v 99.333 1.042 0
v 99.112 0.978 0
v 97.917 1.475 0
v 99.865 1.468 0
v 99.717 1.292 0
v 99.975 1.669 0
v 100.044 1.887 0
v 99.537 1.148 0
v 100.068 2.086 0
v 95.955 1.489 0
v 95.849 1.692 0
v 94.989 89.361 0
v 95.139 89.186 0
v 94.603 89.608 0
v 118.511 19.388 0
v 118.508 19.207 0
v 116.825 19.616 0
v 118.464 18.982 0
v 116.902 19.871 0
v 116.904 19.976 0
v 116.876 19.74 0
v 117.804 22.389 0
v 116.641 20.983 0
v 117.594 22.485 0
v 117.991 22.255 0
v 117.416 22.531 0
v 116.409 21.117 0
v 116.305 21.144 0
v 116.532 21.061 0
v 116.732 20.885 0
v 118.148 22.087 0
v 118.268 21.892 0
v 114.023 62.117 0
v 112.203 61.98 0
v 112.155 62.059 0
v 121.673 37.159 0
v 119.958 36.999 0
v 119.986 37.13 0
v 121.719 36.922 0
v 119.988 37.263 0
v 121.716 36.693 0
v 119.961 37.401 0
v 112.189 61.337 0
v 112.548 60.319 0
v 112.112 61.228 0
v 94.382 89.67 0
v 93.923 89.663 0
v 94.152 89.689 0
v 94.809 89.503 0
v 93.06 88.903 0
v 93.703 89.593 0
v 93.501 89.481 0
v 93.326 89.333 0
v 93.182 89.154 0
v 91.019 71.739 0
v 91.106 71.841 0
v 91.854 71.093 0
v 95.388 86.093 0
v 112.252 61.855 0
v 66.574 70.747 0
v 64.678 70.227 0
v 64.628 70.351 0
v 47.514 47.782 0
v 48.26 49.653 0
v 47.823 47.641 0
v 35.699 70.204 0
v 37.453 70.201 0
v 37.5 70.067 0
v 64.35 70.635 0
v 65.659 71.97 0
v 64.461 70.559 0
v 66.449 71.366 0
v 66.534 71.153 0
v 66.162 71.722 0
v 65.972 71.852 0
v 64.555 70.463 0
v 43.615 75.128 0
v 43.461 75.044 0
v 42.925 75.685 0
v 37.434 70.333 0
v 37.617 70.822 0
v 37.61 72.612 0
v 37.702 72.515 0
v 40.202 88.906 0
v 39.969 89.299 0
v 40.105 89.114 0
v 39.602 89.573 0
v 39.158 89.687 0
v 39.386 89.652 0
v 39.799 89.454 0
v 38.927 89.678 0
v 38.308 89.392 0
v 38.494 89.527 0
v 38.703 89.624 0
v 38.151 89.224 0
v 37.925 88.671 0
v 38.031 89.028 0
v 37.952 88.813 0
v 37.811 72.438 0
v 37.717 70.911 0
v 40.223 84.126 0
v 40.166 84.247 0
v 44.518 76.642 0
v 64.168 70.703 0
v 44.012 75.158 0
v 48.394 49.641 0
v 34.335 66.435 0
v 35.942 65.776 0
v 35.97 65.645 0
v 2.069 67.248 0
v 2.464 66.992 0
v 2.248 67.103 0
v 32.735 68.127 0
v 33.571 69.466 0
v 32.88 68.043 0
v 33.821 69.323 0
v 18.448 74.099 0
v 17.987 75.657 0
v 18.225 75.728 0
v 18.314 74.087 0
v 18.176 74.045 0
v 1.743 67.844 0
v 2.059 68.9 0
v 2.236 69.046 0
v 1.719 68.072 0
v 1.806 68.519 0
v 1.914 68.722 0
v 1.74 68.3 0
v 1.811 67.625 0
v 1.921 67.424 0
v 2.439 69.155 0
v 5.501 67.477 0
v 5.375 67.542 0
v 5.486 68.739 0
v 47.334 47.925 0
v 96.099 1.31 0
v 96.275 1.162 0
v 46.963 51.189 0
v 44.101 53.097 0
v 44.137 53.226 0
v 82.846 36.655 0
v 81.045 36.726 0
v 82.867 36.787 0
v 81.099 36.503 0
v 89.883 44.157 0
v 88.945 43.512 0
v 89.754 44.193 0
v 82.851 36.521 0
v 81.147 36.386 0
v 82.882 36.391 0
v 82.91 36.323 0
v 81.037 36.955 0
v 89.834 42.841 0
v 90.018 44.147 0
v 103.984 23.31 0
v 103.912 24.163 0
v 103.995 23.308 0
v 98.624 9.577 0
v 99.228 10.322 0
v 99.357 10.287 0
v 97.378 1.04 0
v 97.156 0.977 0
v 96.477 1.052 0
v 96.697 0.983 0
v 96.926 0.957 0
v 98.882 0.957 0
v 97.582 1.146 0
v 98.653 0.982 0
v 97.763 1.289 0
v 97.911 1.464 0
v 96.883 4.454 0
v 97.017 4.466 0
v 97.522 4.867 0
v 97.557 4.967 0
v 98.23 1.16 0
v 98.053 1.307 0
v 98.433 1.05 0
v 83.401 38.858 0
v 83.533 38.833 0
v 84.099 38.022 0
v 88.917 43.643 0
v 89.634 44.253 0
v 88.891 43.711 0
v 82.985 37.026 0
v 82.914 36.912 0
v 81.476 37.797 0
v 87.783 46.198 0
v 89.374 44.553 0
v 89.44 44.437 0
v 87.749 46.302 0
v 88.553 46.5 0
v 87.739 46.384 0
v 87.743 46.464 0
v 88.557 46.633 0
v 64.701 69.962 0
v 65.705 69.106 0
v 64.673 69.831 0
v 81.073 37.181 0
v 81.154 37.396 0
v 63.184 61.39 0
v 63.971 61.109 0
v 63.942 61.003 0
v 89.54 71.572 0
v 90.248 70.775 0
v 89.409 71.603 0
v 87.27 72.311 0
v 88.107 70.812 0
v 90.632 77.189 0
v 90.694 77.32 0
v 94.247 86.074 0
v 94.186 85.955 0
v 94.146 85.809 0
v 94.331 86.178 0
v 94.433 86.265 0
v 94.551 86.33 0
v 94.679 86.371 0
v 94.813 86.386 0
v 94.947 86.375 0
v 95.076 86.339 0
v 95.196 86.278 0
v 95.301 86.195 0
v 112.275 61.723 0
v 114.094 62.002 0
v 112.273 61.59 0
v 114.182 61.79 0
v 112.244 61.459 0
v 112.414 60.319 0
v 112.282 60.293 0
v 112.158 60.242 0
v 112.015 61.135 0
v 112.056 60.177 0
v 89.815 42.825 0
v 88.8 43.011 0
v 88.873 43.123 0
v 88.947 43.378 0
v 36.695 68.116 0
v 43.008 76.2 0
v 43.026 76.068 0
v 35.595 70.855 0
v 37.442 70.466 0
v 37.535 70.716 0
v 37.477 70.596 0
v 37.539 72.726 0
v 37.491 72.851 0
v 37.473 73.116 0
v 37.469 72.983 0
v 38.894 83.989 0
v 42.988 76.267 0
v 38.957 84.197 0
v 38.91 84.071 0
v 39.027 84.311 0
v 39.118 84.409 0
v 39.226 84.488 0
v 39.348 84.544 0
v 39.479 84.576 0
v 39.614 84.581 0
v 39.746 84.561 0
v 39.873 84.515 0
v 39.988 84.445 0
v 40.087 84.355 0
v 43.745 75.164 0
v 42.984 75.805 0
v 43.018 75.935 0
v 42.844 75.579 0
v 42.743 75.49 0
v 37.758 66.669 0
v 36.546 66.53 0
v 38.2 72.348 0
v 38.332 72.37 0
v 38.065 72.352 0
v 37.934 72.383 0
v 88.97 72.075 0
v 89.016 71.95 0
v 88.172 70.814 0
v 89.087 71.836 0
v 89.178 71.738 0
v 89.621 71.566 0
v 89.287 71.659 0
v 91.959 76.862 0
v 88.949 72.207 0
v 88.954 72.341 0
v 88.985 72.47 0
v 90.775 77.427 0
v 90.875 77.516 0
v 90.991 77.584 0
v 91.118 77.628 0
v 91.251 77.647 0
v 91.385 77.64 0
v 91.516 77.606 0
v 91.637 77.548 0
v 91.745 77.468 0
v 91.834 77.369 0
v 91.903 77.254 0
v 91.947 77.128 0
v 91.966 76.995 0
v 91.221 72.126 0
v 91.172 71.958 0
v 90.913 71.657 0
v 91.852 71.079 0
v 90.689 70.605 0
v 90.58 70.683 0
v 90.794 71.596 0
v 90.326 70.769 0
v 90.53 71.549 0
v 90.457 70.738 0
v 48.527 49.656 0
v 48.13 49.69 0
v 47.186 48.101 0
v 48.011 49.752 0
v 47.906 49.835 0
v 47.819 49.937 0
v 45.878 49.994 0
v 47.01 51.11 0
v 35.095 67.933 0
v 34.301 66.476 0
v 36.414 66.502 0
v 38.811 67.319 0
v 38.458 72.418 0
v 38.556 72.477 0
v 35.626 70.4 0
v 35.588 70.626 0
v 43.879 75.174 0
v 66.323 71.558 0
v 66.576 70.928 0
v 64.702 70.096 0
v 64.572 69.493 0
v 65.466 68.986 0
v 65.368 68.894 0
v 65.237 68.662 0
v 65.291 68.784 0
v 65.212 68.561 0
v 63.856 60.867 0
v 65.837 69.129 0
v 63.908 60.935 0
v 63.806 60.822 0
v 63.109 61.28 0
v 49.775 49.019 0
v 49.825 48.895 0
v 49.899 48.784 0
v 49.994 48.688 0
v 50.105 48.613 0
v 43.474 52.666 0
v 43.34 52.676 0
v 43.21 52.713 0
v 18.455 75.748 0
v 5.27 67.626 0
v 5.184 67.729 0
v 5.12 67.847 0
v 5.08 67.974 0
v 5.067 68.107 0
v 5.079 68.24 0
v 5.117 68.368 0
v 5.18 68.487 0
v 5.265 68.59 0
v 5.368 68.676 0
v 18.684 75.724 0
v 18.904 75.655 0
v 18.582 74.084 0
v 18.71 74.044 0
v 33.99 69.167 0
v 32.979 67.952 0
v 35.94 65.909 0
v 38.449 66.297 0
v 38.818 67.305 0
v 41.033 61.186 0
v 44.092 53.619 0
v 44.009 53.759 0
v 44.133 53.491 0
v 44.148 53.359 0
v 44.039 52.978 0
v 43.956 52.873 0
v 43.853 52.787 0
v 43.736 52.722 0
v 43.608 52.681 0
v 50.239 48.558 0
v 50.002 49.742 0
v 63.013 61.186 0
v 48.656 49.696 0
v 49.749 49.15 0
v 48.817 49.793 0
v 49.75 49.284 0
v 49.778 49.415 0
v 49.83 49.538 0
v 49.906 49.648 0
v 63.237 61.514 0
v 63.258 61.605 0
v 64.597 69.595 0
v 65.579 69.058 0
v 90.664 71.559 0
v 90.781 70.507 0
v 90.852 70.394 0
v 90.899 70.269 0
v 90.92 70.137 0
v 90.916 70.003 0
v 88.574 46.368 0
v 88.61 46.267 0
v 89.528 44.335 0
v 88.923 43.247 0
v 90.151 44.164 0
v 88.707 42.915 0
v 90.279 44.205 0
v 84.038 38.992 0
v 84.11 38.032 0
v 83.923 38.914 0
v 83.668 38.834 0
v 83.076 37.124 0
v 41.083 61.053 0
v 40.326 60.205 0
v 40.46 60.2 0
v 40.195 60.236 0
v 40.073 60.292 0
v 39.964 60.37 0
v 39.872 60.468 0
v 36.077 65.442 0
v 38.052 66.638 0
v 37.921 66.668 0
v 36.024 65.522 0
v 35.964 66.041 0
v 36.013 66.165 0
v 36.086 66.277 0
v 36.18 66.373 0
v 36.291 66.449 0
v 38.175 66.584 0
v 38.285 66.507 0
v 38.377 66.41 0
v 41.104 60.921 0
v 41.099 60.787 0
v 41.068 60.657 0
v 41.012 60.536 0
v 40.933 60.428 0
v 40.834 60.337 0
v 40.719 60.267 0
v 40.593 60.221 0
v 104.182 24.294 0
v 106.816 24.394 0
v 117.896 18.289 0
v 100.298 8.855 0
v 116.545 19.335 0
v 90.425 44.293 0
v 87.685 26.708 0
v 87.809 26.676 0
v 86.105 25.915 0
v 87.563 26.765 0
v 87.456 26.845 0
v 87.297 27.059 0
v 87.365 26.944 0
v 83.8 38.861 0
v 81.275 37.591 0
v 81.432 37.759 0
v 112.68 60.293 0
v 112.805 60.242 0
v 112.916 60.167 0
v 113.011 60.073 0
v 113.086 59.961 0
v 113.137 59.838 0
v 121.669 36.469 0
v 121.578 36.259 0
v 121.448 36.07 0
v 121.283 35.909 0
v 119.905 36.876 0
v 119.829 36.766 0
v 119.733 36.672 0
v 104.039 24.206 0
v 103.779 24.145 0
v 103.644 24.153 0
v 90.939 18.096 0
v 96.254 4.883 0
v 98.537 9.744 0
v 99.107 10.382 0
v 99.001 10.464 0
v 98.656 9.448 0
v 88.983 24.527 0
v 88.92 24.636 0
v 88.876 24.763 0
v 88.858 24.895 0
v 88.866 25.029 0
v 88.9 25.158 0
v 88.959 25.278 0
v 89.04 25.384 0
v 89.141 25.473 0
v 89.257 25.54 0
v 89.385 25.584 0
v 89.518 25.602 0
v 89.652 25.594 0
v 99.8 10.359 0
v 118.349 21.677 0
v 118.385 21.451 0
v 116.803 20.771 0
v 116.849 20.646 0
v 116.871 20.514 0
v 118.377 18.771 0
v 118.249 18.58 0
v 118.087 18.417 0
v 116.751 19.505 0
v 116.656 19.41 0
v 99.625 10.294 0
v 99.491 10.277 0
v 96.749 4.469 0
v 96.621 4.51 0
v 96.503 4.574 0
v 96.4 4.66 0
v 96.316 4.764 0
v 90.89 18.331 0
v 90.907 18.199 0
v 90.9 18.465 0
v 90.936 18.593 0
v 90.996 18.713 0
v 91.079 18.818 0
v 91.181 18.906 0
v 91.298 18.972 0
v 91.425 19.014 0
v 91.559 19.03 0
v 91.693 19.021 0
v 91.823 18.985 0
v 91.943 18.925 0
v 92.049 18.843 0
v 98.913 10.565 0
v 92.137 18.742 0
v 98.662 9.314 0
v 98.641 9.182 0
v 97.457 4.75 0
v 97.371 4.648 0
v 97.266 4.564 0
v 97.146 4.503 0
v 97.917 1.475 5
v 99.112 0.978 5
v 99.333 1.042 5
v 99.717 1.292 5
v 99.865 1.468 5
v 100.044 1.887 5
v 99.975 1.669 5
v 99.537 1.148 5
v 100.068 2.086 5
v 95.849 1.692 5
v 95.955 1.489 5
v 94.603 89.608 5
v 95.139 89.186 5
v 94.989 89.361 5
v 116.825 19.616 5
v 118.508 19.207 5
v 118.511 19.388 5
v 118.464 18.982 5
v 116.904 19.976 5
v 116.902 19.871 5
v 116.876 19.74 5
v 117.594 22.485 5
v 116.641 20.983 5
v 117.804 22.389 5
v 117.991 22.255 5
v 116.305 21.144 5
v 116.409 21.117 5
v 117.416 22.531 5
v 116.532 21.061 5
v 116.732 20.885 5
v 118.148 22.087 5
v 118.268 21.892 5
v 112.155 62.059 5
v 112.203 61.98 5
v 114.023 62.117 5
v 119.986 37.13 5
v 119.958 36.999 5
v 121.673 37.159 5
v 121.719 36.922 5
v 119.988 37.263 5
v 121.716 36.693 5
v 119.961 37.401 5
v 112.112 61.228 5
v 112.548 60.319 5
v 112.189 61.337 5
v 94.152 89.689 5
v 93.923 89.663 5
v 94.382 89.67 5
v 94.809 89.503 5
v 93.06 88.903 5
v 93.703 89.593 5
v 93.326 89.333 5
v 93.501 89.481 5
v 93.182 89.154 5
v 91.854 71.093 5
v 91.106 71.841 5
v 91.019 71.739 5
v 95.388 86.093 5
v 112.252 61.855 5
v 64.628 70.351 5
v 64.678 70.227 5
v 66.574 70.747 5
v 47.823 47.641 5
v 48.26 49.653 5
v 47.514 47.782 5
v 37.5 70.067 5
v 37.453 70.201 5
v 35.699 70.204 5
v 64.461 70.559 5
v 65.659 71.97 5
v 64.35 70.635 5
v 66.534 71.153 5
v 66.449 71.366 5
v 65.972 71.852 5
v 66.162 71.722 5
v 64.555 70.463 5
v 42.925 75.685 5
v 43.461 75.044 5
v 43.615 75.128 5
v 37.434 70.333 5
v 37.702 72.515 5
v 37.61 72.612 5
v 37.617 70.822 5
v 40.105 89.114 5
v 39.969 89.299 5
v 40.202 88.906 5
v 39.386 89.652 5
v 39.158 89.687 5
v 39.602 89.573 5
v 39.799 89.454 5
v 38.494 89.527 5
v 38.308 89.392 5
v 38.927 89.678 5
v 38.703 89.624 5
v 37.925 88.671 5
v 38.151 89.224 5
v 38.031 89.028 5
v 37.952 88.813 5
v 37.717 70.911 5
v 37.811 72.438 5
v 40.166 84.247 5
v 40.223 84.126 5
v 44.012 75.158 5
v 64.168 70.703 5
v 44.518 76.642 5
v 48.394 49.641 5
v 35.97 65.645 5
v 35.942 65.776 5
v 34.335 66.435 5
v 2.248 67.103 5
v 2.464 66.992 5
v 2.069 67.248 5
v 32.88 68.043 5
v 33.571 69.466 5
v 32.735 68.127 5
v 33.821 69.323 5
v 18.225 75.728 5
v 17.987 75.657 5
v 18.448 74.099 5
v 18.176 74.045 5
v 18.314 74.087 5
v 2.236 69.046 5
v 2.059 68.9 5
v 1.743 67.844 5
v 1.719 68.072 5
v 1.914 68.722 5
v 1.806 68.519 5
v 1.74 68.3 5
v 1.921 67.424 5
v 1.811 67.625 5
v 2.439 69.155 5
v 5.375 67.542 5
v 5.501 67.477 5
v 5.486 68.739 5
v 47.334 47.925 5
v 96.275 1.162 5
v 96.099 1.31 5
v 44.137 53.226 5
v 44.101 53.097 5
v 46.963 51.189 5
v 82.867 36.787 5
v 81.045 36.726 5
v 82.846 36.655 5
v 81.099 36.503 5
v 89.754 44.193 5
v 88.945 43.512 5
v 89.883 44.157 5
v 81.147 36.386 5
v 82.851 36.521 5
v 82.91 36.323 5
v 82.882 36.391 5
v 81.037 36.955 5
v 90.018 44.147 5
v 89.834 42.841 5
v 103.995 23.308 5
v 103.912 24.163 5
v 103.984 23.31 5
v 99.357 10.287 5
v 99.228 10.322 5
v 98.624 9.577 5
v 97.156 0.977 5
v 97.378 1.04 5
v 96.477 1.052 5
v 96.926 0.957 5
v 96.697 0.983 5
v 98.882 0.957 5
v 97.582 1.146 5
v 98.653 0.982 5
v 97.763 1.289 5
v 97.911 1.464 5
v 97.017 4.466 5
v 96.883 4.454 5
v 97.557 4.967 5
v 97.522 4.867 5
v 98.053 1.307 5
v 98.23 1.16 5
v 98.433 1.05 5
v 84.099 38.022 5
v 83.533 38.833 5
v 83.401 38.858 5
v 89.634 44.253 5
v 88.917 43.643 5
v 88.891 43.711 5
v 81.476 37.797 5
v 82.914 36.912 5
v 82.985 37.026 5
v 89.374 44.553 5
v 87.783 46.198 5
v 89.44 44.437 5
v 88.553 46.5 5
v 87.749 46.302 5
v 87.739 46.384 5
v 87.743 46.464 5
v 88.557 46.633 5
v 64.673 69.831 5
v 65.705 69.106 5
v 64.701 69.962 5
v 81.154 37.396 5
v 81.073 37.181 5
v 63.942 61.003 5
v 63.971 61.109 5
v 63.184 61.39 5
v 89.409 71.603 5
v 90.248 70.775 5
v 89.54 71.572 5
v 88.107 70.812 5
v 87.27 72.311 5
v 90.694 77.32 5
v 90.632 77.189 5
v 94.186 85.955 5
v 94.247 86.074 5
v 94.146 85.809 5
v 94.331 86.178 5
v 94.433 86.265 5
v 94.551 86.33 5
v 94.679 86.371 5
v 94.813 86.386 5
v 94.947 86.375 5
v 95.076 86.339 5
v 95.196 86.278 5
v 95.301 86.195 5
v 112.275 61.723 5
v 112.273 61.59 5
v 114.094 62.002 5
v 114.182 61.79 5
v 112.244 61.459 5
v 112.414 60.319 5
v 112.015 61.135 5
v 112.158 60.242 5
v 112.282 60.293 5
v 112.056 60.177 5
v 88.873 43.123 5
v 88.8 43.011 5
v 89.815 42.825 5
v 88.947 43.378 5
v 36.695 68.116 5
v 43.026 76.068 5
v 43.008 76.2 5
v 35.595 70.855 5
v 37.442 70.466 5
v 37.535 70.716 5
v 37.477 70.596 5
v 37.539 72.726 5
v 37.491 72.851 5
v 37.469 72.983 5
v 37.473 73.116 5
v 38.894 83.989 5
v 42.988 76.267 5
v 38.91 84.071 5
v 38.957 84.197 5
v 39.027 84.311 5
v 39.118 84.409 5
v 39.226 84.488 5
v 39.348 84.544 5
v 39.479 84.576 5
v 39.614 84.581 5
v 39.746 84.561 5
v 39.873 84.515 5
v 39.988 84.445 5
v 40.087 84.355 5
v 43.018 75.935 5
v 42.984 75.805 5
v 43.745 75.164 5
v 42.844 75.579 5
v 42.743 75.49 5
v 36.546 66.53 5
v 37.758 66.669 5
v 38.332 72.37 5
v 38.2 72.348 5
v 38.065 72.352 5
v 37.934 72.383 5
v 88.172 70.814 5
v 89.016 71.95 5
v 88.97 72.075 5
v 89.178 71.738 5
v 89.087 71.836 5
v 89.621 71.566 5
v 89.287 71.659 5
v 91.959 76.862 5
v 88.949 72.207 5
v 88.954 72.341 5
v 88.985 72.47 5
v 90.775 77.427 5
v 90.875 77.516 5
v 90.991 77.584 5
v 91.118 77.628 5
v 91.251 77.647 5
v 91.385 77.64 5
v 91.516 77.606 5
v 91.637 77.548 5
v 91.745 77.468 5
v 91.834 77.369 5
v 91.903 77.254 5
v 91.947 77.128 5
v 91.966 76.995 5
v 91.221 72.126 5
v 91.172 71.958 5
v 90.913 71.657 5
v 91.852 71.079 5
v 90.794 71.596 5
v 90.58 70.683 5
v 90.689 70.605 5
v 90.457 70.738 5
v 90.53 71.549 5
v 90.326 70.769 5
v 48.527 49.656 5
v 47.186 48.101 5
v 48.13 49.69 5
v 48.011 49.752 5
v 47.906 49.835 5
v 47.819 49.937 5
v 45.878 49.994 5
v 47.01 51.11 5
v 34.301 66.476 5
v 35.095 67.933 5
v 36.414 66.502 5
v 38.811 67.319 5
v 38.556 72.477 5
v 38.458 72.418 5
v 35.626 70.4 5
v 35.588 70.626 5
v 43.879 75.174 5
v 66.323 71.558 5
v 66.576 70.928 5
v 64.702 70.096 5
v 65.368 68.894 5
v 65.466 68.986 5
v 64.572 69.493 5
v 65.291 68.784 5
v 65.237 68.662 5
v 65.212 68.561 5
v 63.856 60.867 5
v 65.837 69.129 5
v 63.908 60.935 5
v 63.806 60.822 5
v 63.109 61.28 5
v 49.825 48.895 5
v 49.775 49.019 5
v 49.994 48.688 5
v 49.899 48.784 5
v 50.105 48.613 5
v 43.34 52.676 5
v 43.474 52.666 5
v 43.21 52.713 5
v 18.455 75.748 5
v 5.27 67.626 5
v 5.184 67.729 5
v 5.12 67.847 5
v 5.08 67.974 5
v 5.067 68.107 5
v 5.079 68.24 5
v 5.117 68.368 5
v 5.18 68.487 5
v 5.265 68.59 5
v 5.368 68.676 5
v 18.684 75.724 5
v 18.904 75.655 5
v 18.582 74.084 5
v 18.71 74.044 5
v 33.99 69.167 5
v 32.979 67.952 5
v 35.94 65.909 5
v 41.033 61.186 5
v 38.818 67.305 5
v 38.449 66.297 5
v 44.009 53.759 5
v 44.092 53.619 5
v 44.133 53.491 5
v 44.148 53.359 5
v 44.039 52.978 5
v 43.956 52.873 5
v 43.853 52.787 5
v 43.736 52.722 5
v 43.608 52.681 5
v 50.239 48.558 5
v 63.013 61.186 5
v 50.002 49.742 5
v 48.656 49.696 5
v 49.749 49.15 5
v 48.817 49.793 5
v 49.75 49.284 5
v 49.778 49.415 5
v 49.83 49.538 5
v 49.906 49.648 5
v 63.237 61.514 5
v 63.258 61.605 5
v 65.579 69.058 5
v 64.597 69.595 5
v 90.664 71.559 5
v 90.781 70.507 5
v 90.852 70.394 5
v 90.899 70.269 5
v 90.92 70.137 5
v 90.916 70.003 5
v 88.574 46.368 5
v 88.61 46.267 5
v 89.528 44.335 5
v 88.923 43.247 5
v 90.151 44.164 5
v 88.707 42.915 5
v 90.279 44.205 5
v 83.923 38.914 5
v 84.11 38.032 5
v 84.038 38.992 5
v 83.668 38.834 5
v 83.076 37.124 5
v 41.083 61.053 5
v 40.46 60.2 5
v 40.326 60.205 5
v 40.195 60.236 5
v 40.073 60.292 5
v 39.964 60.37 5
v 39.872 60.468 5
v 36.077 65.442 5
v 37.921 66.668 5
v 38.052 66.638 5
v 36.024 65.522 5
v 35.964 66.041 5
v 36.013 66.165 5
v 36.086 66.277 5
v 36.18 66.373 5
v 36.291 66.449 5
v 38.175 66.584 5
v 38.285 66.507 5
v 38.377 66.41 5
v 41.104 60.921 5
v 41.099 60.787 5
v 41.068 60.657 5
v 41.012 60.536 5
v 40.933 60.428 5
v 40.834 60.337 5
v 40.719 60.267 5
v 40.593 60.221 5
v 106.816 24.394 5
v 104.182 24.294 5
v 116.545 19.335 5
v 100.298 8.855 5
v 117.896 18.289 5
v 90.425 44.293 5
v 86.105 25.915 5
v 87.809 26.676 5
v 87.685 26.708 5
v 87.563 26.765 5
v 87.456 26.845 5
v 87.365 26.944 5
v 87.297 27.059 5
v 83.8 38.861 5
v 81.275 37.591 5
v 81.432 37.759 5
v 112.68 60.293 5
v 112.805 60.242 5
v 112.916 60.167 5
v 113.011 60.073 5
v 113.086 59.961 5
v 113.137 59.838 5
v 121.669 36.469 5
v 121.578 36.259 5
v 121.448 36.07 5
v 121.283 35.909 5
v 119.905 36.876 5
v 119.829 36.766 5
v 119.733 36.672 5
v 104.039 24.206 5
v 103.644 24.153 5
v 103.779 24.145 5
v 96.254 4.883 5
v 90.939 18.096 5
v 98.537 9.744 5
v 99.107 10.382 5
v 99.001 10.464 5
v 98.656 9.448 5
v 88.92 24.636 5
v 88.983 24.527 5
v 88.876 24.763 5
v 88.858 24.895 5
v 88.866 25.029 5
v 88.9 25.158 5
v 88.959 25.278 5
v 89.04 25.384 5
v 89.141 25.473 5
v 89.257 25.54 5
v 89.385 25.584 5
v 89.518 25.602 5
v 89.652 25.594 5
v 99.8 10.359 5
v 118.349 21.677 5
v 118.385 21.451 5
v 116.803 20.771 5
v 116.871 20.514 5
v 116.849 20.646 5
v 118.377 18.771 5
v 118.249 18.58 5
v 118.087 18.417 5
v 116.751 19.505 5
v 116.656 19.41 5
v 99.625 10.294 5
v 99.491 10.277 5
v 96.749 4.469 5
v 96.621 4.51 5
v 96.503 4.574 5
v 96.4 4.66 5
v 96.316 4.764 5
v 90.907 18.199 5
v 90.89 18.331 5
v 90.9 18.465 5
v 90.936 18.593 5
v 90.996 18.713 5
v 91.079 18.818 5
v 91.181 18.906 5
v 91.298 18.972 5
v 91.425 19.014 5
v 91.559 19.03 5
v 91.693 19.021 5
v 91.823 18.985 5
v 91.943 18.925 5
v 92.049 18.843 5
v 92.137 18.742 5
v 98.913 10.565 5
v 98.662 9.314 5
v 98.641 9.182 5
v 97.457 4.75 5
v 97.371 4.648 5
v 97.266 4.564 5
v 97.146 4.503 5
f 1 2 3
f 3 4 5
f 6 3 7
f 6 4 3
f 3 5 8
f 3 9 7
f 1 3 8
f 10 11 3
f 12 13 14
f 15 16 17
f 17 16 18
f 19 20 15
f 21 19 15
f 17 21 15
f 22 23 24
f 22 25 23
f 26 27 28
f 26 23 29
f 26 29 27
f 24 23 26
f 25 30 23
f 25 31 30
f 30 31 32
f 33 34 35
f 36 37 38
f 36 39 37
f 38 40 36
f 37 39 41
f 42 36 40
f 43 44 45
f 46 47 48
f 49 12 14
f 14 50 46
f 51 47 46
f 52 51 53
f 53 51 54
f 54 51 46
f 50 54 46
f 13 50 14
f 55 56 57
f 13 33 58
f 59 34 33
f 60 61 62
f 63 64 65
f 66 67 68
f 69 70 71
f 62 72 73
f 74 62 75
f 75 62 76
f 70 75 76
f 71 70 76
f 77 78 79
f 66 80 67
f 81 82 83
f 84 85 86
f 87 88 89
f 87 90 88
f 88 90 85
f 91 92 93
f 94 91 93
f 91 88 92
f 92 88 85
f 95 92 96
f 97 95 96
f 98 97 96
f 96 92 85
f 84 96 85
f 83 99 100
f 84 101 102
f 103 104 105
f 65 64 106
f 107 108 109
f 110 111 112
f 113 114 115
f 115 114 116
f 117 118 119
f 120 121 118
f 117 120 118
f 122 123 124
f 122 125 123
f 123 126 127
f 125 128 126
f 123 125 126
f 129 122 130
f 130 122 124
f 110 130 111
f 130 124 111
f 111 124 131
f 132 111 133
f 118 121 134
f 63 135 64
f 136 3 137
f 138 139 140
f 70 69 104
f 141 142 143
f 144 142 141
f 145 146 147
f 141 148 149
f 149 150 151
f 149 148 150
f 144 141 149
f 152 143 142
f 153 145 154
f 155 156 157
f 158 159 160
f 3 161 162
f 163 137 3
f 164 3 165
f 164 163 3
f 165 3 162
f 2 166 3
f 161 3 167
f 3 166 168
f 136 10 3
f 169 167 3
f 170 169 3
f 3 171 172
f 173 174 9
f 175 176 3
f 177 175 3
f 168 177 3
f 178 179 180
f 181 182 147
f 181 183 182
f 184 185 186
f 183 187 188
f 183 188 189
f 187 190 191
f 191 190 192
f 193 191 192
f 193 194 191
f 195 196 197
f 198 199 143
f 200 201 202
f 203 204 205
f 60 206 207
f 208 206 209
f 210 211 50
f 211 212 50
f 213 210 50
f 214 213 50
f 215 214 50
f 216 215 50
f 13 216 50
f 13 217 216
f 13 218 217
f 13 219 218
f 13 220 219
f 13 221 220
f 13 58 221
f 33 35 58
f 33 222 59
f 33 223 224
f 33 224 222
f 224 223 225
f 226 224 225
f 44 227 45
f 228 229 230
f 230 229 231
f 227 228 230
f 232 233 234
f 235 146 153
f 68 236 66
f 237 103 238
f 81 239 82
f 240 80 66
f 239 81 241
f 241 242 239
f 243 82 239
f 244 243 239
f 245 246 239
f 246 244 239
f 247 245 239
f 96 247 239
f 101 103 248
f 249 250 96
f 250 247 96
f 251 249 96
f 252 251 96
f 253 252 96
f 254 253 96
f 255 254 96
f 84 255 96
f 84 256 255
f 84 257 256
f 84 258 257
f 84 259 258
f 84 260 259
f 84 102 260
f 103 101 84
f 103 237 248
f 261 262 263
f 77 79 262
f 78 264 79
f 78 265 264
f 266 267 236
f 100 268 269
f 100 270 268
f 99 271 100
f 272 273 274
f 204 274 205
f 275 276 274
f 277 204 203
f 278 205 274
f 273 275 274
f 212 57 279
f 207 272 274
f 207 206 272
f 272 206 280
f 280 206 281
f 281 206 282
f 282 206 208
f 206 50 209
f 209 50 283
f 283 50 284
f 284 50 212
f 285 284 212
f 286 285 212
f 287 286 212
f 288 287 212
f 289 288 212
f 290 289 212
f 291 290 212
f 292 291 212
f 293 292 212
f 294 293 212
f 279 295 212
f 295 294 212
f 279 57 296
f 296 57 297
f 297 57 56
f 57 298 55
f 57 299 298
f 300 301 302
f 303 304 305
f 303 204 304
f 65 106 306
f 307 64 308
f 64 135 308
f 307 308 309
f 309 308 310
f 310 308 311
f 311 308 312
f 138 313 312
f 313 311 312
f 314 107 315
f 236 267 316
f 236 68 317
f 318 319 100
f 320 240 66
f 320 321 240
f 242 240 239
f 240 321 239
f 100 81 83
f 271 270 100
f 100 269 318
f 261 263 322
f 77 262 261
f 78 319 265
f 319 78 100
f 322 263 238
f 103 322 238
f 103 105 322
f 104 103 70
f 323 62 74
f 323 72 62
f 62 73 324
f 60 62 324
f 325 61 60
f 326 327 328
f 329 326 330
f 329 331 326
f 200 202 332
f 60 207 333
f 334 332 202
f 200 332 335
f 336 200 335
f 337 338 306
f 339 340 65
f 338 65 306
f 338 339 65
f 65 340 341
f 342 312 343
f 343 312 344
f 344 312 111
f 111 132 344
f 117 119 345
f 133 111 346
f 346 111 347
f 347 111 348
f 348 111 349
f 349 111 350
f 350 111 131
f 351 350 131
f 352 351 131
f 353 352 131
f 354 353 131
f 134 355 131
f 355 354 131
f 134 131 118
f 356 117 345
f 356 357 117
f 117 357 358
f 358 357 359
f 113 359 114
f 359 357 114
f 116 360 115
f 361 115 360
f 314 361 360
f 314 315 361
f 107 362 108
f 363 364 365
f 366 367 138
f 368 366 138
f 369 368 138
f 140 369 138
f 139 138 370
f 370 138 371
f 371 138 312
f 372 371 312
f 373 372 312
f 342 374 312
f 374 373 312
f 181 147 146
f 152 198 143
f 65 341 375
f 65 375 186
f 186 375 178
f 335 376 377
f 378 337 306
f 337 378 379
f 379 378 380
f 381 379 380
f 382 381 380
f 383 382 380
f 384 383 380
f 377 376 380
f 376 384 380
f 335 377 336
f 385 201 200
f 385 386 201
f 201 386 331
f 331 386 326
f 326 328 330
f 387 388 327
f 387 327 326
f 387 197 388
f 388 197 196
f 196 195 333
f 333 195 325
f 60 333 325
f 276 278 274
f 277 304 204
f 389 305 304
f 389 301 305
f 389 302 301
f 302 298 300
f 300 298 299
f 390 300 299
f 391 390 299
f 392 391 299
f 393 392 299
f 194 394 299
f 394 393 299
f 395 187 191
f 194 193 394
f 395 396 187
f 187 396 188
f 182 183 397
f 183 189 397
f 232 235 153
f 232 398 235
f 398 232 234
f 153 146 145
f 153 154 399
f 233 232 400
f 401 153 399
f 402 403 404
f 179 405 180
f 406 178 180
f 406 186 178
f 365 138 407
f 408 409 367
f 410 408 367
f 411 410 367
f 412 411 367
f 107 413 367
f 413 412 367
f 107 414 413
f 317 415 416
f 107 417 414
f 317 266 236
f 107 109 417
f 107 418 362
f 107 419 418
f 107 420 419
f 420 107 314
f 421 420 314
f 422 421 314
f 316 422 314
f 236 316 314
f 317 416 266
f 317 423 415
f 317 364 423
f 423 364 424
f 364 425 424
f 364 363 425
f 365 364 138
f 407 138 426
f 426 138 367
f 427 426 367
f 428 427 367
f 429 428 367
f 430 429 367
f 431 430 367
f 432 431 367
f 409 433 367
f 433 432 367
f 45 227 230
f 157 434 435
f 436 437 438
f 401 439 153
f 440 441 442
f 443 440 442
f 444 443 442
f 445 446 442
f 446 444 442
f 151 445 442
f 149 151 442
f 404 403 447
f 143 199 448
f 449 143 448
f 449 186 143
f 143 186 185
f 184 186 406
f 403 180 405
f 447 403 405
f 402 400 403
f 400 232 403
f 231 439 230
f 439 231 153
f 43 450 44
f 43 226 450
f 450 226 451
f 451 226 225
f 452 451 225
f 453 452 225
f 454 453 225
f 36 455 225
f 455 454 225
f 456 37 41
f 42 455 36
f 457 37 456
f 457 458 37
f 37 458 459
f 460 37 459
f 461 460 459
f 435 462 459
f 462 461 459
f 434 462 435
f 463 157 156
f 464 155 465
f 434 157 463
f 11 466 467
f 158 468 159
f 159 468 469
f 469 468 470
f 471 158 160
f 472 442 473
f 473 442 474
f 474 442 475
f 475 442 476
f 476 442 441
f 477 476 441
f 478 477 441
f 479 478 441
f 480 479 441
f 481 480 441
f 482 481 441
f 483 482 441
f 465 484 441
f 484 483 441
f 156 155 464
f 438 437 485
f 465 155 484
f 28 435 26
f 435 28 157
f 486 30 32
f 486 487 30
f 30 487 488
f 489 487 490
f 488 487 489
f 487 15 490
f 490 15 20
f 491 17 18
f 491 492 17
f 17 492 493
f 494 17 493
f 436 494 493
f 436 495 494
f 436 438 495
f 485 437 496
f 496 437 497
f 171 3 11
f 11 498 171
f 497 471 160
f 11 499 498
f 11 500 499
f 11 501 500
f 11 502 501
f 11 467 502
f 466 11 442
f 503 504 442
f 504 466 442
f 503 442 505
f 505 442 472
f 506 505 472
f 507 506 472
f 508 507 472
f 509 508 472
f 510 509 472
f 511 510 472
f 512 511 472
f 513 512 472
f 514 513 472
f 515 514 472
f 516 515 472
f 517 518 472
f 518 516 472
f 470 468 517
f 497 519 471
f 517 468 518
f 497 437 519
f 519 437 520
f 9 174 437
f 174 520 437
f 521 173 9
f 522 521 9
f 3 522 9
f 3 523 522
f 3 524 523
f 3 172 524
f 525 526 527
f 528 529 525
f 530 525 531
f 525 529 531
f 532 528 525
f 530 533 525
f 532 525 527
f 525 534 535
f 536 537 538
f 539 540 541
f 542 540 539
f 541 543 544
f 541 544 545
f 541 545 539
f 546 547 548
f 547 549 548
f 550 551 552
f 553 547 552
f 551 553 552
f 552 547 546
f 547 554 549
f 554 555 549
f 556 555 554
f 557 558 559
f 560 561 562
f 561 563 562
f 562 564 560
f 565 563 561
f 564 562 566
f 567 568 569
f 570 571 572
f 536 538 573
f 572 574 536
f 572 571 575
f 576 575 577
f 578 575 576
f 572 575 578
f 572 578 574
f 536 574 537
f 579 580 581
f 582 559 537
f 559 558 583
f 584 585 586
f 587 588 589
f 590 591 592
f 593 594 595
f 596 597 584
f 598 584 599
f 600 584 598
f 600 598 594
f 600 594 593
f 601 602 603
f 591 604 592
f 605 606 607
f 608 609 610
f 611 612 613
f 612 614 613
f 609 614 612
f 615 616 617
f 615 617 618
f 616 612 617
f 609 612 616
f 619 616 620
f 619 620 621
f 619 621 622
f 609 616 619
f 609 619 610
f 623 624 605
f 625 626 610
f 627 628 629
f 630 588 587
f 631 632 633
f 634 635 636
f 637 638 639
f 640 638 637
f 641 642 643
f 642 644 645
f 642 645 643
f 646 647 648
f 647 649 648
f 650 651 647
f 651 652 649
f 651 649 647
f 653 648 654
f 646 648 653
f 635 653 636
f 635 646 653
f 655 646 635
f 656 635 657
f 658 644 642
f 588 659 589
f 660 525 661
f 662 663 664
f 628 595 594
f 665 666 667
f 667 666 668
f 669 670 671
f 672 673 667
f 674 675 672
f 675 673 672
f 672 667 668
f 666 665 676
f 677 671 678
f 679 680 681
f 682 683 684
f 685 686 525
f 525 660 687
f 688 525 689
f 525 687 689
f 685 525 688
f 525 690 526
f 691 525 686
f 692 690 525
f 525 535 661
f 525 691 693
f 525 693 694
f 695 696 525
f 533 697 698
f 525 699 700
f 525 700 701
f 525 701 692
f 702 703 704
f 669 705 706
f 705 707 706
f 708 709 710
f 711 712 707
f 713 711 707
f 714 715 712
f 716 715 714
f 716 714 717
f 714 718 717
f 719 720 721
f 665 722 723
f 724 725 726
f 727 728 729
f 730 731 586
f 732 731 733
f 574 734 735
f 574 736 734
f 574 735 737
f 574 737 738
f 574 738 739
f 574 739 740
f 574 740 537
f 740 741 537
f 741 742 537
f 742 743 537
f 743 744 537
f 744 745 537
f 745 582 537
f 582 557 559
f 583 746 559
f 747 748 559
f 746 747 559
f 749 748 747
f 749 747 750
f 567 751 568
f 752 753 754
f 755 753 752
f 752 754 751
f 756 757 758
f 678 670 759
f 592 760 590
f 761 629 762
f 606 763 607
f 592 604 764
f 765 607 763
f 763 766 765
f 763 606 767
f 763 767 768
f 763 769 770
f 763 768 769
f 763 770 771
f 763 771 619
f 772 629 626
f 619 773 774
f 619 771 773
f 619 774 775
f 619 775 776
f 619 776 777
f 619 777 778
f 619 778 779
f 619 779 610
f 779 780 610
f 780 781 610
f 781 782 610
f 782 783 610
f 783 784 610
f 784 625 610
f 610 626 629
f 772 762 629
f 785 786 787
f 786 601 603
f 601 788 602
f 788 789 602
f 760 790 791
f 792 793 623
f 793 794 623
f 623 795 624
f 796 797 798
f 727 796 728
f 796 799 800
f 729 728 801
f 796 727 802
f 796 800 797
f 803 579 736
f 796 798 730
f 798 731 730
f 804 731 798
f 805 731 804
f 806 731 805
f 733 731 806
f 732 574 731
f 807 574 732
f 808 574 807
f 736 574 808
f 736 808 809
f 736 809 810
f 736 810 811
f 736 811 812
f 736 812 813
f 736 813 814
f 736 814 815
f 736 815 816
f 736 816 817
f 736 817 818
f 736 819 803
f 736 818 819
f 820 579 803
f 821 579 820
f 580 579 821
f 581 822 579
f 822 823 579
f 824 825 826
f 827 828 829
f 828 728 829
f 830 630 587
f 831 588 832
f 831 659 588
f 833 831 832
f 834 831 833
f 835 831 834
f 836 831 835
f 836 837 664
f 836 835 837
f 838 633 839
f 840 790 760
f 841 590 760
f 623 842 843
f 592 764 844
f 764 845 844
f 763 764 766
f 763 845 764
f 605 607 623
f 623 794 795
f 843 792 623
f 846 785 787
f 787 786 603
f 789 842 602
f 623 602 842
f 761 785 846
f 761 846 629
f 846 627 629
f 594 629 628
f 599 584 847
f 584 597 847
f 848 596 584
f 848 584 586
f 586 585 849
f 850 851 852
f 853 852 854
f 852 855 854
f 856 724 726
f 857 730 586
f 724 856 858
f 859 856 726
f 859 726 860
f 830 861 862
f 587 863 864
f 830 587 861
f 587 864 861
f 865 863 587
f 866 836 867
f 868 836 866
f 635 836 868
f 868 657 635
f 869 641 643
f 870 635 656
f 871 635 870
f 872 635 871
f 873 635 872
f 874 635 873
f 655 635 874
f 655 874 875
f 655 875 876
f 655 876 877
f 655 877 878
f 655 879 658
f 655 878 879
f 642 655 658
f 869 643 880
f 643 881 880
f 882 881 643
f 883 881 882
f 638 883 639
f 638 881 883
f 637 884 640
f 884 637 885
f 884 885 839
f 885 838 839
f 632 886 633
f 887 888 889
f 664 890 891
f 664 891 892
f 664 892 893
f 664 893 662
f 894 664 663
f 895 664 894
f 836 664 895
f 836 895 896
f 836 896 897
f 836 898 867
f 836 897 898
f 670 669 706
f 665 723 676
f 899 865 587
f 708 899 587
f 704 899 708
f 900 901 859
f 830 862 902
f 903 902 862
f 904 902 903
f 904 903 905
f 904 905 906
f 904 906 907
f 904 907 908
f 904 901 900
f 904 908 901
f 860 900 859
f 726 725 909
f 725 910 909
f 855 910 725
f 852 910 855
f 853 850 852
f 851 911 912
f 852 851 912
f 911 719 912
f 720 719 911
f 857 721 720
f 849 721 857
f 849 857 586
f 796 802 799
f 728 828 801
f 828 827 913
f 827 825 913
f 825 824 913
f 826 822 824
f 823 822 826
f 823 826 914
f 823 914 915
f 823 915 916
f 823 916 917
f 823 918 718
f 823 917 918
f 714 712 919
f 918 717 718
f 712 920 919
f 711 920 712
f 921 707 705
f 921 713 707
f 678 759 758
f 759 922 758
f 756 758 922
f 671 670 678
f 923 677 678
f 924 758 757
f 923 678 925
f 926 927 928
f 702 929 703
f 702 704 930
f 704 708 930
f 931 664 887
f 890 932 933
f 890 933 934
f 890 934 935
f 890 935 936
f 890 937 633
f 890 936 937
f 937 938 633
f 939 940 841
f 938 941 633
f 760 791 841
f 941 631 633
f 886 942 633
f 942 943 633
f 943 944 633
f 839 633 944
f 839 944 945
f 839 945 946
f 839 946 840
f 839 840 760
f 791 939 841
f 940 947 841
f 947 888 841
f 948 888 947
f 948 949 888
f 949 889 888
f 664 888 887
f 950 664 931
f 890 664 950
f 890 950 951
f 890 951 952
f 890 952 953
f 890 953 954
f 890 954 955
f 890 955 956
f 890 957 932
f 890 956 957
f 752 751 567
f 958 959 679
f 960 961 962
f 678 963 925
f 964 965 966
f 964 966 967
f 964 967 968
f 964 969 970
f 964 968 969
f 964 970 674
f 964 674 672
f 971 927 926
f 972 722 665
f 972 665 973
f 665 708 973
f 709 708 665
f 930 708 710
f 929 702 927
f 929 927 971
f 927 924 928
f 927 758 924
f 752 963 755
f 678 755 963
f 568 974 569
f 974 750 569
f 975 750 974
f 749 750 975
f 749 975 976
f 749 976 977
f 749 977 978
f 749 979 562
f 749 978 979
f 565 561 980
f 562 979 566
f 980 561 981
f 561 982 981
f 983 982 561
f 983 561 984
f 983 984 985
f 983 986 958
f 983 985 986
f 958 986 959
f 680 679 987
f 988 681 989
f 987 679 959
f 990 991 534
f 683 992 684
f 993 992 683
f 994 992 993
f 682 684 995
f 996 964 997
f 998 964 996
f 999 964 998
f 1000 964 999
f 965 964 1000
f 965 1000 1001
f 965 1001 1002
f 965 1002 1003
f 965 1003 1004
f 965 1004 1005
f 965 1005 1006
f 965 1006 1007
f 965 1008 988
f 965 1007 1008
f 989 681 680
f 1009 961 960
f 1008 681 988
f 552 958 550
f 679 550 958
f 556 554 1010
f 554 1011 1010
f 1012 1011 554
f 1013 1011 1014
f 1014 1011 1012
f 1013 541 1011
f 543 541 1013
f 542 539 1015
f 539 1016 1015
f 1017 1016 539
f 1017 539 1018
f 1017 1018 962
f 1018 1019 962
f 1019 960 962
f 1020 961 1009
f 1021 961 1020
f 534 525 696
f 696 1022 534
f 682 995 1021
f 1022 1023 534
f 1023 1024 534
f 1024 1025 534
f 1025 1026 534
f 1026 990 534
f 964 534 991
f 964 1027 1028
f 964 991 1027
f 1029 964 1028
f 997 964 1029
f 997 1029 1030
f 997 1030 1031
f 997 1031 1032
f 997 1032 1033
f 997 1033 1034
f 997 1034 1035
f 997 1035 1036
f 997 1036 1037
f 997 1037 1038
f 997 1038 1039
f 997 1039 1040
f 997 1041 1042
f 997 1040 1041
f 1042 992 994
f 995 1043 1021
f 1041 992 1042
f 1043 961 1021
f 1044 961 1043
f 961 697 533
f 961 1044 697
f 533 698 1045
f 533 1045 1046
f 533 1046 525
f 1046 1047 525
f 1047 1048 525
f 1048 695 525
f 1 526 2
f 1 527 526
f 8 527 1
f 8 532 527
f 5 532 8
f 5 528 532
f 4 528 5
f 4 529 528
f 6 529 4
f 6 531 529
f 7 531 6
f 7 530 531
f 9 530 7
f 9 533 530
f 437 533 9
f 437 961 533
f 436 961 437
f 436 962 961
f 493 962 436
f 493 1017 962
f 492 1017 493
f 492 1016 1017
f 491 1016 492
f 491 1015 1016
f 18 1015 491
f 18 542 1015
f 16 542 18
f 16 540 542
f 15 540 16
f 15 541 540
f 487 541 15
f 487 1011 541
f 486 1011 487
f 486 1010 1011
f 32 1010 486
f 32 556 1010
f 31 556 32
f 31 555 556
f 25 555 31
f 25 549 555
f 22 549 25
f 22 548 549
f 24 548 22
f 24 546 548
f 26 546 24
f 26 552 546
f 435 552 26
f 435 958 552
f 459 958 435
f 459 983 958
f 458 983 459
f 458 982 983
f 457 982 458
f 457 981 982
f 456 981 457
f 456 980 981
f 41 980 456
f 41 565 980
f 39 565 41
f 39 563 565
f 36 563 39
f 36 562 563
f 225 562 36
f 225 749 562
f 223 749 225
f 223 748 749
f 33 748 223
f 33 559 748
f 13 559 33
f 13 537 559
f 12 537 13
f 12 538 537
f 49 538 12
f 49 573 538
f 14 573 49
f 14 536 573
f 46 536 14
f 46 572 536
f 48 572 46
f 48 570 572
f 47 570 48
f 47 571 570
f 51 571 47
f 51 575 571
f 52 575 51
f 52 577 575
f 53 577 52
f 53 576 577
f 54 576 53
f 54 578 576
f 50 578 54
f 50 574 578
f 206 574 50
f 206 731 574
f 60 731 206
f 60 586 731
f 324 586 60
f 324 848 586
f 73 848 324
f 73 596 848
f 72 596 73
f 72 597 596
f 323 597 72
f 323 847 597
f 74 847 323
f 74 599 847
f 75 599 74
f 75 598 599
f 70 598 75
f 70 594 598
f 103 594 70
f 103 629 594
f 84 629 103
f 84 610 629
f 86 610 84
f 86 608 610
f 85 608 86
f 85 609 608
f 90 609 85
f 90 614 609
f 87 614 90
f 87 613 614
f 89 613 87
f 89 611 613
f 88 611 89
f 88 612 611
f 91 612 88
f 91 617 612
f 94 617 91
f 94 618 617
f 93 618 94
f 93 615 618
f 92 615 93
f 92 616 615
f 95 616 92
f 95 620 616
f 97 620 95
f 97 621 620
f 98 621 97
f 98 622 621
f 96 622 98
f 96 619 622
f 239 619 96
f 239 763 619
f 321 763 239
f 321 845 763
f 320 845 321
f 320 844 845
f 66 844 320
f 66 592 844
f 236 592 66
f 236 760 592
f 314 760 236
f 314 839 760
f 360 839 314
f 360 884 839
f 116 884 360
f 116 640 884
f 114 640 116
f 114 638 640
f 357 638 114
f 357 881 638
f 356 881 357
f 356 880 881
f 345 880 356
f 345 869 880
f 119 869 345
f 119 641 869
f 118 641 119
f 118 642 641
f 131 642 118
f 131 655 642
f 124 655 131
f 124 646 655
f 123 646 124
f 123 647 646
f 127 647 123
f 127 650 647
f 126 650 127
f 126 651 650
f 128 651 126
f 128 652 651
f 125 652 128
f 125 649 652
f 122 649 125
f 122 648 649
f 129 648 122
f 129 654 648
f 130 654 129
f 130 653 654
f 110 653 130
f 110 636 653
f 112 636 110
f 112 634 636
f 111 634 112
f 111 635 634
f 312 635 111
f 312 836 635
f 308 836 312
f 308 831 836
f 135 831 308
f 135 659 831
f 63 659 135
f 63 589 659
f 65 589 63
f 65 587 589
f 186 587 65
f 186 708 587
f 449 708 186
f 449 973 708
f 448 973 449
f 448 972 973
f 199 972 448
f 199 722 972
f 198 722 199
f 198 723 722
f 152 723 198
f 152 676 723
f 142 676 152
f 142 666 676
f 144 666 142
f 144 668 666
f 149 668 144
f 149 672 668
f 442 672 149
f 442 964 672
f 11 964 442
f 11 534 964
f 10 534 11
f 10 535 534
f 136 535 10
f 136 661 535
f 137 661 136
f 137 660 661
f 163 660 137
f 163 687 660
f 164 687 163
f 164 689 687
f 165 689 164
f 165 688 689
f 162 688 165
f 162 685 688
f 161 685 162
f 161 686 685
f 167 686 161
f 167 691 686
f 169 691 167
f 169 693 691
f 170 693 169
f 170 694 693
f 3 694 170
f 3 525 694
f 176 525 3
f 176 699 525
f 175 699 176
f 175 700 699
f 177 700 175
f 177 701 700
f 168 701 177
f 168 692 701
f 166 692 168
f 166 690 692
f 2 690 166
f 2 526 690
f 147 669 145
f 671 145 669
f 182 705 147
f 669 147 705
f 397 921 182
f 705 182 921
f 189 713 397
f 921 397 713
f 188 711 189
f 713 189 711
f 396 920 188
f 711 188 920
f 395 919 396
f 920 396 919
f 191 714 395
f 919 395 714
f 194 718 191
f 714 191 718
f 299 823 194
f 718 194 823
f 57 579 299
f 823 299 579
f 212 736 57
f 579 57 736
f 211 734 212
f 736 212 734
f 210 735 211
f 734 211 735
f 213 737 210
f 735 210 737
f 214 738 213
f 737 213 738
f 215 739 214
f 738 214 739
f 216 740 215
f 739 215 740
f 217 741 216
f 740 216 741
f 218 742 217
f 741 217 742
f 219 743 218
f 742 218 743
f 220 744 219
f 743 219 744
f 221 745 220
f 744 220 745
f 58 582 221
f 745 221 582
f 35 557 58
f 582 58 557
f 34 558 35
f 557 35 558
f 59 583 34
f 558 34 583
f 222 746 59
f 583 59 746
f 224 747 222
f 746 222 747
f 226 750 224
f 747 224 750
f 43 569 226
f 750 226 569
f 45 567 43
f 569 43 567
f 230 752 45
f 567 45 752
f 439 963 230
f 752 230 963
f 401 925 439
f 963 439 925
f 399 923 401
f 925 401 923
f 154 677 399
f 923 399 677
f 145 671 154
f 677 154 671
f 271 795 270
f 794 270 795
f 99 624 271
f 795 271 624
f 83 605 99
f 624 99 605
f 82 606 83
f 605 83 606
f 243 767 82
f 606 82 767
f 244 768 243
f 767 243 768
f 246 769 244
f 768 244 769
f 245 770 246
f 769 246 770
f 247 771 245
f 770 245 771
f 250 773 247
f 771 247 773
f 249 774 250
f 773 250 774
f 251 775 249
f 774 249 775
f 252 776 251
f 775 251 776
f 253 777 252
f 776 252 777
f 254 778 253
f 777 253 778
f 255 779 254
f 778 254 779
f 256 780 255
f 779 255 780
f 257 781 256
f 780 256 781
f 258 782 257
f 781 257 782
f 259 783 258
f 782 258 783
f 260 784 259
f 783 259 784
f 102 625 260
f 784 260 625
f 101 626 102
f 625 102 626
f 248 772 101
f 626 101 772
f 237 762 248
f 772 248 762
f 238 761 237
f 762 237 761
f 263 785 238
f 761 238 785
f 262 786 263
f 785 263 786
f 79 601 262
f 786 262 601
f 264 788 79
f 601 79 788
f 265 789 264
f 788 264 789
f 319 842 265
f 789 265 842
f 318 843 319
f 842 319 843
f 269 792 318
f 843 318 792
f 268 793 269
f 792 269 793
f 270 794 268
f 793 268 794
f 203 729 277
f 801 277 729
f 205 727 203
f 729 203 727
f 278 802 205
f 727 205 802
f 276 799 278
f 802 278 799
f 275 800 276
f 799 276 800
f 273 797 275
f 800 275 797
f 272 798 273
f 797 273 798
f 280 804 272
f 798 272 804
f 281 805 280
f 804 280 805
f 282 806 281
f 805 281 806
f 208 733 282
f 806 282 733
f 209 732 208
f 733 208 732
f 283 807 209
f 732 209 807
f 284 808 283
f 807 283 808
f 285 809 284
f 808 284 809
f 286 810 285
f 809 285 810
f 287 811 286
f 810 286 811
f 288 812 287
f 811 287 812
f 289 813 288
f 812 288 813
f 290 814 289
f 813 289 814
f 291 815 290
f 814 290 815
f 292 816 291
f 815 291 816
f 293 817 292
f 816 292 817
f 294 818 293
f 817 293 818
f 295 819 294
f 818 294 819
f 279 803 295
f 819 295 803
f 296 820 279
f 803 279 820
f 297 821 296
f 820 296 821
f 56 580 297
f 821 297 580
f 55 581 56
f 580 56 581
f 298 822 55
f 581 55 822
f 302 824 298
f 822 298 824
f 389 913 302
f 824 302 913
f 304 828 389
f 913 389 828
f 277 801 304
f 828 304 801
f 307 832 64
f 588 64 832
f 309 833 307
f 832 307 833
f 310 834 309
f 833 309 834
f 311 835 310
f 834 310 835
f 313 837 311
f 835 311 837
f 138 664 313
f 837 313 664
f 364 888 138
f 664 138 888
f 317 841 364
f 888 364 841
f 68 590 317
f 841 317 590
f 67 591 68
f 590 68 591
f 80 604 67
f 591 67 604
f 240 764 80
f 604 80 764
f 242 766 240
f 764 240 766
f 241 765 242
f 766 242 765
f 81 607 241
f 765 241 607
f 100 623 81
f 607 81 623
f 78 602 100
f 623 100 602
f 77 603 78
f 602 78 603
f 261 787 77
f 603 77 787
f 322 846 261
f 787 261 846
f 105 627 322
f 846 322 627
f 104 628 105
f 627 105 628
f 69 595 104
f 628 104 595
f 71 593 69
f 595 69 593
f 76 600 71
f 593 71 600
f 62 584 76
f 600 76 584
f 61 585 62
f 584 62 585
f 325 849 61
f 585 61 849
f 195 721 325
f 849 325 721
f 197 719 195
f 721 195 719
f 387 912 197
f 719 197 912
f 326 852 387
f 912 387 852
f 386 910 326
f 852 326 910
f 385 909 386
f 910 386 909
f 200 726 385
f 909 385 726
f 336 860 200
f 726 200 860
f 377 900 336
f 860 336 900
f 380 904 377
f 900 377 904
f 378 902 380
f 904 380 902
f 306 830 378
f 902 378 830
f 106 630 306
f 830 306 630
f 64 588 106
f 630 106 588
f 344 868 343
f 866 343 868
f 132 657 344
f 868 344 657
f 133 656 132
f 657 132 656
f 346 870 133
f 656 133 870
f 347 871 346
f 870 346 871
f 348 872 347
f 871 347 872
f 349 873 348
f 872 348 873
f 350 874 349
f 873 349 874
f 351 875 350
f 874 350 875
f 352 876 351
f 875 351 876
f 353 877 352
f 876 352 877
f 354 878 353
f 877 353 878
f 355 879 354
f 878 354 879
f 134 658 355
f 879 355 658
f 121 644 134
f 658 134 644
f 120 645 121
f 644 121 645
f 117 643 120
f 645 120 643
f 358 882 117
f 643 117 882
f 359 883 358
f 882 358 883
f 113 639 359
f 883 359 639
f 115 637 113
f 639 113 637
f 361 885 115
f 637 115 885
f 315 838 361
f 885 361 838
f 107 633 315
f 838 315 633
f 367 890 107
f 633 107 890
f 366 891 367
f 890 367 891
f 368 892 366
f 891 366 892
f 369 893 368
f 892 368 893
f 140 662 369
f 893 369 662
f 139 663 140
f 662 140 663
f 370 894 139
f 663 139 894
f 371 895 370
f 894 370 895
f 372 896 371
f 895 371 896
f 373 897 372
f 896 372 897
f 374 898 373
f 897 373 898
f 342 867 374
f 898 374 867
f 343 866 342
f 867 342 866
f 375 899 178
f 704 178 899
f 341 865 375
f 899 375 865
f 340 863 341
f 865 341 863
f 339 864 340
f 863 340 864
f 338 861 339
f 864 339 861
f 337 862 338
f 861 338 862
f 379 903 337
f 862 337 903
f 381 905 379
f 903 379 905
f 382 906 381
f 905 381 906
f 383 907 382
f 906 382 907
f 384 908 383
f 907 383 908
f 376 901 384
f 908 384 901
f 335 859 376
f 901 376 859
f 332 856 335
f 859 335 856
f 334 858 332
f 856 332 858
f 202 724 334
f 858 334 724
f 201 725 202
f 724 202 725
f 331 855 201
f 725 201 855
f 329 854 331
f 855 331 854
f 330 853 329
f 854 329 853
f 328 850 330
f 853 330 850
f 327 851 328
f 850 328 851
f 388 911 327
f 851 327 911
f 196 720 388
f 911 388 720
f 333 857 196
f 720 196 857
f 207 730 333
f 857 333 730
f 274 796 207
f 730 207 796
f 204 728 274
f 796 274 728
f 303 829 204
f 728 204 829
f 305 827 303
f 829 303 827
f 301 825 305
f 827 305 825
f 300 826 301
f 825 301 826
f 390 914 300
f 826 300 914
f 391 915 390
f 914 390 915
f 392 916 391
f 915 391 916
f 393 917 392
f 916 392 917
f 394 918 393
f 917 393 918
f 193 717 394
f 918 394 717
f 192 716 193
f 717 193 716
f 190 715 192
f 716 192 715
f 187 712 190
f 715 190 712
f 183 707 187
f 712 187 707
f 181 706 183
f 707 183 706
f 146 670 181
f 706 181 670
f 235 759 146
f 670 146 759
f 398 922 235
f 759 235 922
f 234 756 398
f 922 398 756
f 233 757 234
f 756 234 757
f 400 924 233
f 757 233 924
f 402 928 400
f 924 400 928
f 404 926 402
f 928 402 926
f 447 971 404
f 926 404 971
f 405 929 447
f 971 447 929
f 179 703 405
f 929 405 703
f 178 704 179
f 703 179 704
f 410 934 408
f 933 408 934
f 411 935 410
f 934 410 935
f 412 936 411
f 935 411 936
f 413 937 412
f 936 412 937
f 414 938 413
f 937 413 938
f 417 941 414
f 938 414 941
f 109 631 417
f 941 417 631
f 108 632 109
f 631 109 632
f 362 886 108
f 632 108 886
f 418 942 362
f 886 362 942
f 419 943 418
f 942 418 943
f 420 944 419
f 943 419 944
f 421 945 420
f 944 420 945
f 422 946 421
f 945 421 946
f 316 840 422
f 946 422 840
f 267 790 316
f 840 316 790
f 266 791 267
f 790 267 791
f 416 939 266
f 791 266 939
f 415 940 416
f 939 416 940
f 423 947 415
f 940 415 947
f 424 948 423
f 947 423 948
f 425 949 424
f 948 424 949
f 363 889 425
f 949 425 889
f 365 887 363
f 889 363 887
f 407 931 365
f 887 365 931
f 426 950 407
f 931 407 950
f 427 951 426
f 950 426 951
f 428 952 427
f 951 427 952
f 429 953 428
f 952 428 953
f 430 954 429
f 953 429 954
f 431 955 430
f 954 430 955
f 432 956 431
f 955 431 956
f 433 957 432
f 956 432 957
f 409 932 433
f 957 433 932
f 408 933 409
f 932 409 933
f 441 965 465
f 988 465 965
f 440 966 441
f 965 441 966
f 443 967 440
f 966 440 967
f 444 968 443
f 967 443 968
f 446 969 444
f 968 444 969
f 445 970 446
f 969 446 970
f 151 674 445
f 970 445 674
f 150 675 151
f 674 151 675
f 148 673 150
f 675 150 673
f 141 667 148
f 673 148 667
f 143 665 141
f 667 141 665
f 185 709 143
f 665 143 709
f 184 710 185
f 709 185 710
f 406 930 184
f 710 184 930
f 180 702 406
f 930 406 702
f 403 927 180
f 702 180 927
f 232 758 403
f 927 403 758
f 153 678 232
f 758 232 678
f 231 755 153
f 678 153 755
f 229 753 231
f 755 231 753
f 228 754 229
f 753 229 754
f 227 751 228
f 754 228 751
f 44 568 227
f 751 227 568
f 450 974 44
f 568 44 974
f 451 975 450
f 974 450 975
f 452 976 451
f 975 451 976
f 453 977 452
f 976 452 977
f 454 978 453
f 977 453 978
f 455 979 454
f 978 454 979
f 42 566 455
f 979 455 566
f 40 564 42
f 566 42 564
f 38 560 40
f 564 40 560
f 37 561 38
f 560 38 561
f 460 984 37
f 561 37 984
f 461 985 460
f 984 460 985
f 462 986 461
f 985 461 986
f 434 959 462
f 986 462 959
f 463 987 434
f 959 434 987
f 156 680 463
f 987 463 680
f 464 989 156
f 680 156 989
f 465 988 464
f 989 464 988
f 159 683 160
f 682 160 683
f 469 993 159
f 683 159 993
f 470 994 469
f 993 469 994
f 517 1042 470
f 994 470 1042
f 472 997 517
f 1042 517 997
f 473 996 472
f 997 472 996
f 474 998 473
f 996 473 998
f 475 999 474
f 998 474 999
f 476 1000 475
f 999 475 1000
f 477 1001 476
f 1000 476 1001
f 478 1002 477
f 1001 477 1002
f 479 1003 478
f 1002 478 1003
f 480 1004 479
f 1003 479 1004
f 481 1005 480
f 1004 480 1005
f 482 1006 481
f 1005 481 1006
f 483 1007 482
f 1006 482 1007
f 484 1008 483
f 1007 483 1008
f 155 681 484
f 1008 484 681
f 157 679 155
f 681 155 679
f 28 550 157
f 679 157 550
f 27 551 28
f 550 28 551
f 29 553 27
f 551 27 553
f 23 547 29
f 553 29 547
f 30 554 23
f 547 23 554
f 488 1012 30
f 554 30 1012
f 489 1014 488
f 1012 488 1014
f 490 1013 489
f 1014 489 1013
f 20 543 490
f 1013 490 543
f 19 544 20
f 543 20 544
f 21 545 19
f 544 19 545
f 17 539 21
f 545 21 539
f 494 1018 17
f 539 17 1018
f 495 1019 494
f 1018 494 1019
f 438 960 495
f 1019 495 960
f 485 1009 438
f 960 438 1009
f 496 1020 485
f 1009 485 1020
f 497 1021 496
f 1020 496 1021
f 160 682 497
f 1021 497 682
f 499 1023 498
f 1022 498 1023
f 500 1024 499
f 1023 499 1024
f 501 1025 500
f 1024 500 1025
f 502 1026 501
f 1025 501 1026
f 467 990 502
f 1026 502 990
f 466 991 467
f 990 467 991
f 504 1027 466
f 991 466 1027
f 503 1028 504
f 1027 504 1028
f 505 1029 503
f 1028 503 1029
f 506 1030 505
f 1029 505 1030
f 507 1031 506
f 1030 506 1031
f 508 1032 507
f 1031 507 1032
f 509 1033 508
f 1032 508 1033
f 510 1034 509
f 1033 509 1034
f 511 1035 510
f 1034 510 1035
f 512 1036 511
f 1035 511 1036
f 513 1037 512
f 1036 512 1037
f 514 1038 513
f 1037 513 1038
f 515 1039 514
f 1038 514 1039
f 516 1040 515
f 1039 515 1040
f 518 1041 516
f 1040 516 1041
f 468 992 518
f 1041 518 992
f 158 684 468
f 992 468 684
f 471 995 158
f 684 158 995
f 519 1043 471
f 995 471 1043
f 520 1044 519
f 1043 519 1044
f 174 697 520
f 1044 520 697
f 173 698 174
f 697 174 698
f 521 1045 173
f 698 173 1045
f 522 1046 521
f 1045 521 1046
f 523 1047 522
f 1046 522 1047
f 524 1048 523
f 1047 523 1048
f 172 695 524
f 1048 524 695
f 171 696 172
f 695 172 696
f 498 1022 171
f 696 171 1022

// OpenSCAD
/*
 * Customizable Origami - Fox - https://www.thingiverse.com/thing:2778932
 * by Dennis Hofmann - https://www.thingiverse.com/mightynozzle/about
 * created 2018-02-02
 * version v1.0
 *
 * Changelog
 * --------------
 * v1.0:
 *      - final design
 * --------------
 * 
 * This work is licensed under the Creative Commons - Attribution - NonCommercial - ShareAlike license.
 * https://creativecommons.org/licenses/by-nc-sa/3.0/
 */


 // Parameter Section //
//-------------------//

// preview[view:north, tilt:top]

// The maximum size of the longest side. The shorter side will be automatically resized in same ratio.
max_size_in_millimeter = 120; //[20:300]

// The height of the model.
model_height_in_millimeter = 5; //[0.2:0.2:100]

// Thickness of the outer outline.
outline_size_in_millimeter = 1.6; //[0.5:0.1:20]

// Thickness of the inner outline.
inline_size_in_millimeter = 0.8; //[0.5:0.1:20]

// Roundiness of the ends of the inner outlines.
inline_edge_radius_in_millimeter = 0.7; //[0.0:0.1:5]

// Flip model
flip_model = "no"; //[yes,no]

/*[hidden]*/
max_size = max_size_in_millimeter;
model_height = model_height_in_millimeter;
$fn=32;

// Outer Points
A1 = [46, 1089];
A2 = [741, 815];
A3 = [765, 780];
A4 = [1332, 613];
A5 = [1306, 590];
A6 = [1385, 422];
A7 = [1540, 34];
A8 = [1552, 63];
A9 = [1571, 34];
A10 = [1575, 153];
A11 = [1864, 309];
A12 = [1862, 342];
A13 = [1653, 379];
A14 = [1915, 589];
A15 = [1796, 983];
A16 = [1496, 1416];
A17 = [1400, 1139];
A18 = [1032, 1111];
A19 = [1039, 1133];
A20 = [693, 1210];
A21 = [621, 1416];
A22 = [584, 1131];
A23 = [611, 1074];
A24 = [550, 1067];
A25 = [526, 1094];
A26 = [293, 1193];

outline = [A1, A2, A3, A4, A5, A6, A7, A8, A9, A10, A11, A12, A13, A14, A15, A16, A17, A18, A19, A20, A21, A22, A23, A24, A25, A26];

// Inner Points
B1 = [1010, 978];
B2 = [1400, 742];
B3 = [1423, 690];
B4 = [1453, 1138];

// Polygons
C1 = [A1, A2, A24, A25, A26];
C2 = [A24, A2, A23];
C3 = [A2, A3, B1, A18, A19, A20, A22, A23];
C4 = [A22, A21, A20];
C5 = [A3, A4, B3, B2, B4, A17, A18, B1];
C6 = [B3, B2, B4, A16, A15];
C7 = [A17, B4, A16];
C8 = [A4, A5, A6, A13, A14, A15, B3];
C9 = [A6, A10, A11, A12, A13];
C10 = [A6, A7, A8, A10];
C11 = [A8, A9, A10];

cut_polygons = [C1, C2, C3, C4, C5, C6, C7, C8, C9, C10, C11];

min_x = A1[0];
min_y = A7[1];
max_x = A14[0];
max_y = A16[1];

x_size = max_x - min_x;
y_size = max_y - min_y;

x_factor = max_size / x_size;
y_factor = max_size / y_size;

inline_size = x_size > y_size ? inline_size_in_millimeter / x_factor / 2: inline_size_in_millimeter / y_factor / 2;
inline_edge_radius = x_size > y_size ? inline_edge_radius_in_millimeter / x_factor: inline_edge_radius_in_millimeter / y_factor;
outline_size = x_size > y_size ? outline_size_in_millimeter / x_factor - inline_size: outline_size_in_millimeter / y_factor - inline_size;


 // Program Section //
//-----------------//

if(x_size > y_size) {
    resize(newsize=[max_size, x_factor * y_size, model_height]){
        if(flip_model == "yes") {
            mirror([0,1,0]) {
                rotate([180,180,0]) {    
                    create(outline, cut_polygons);
                }
            }
        } else {
            create(outline, cut_polygons);
        }
    }
} else {
    resize(newsize=[y_factor * x_size, max_size, model_height]){
        if(flip_model == "yes") {
            mirror([0,1,0]) {
                rotate([180,180,0]) {    
                    create(outline, cut_polygons);
                }
            }
        } else {
            create(outline, cut_polygons);
        }
    }
}


 // Module Section //
//----------------//

module create() {
    linear_extrude(height=1) {
        difference() {
            offset(r = -0) {
                offset(r = +outline_size) {
                    polygon(points = outline, convexity = 10);
                }
            }
            
            for(cut_polygon = [0:len(cut_polygons)]) {
                offset(r = +inline_edge_radius) {
                    offset(r = -inline_size - inline_edge_radius) {
                        polygon(points = cut_polygons[cut_polygon], convexity = 10);
                    }
                }
            }
        }
    }
}
